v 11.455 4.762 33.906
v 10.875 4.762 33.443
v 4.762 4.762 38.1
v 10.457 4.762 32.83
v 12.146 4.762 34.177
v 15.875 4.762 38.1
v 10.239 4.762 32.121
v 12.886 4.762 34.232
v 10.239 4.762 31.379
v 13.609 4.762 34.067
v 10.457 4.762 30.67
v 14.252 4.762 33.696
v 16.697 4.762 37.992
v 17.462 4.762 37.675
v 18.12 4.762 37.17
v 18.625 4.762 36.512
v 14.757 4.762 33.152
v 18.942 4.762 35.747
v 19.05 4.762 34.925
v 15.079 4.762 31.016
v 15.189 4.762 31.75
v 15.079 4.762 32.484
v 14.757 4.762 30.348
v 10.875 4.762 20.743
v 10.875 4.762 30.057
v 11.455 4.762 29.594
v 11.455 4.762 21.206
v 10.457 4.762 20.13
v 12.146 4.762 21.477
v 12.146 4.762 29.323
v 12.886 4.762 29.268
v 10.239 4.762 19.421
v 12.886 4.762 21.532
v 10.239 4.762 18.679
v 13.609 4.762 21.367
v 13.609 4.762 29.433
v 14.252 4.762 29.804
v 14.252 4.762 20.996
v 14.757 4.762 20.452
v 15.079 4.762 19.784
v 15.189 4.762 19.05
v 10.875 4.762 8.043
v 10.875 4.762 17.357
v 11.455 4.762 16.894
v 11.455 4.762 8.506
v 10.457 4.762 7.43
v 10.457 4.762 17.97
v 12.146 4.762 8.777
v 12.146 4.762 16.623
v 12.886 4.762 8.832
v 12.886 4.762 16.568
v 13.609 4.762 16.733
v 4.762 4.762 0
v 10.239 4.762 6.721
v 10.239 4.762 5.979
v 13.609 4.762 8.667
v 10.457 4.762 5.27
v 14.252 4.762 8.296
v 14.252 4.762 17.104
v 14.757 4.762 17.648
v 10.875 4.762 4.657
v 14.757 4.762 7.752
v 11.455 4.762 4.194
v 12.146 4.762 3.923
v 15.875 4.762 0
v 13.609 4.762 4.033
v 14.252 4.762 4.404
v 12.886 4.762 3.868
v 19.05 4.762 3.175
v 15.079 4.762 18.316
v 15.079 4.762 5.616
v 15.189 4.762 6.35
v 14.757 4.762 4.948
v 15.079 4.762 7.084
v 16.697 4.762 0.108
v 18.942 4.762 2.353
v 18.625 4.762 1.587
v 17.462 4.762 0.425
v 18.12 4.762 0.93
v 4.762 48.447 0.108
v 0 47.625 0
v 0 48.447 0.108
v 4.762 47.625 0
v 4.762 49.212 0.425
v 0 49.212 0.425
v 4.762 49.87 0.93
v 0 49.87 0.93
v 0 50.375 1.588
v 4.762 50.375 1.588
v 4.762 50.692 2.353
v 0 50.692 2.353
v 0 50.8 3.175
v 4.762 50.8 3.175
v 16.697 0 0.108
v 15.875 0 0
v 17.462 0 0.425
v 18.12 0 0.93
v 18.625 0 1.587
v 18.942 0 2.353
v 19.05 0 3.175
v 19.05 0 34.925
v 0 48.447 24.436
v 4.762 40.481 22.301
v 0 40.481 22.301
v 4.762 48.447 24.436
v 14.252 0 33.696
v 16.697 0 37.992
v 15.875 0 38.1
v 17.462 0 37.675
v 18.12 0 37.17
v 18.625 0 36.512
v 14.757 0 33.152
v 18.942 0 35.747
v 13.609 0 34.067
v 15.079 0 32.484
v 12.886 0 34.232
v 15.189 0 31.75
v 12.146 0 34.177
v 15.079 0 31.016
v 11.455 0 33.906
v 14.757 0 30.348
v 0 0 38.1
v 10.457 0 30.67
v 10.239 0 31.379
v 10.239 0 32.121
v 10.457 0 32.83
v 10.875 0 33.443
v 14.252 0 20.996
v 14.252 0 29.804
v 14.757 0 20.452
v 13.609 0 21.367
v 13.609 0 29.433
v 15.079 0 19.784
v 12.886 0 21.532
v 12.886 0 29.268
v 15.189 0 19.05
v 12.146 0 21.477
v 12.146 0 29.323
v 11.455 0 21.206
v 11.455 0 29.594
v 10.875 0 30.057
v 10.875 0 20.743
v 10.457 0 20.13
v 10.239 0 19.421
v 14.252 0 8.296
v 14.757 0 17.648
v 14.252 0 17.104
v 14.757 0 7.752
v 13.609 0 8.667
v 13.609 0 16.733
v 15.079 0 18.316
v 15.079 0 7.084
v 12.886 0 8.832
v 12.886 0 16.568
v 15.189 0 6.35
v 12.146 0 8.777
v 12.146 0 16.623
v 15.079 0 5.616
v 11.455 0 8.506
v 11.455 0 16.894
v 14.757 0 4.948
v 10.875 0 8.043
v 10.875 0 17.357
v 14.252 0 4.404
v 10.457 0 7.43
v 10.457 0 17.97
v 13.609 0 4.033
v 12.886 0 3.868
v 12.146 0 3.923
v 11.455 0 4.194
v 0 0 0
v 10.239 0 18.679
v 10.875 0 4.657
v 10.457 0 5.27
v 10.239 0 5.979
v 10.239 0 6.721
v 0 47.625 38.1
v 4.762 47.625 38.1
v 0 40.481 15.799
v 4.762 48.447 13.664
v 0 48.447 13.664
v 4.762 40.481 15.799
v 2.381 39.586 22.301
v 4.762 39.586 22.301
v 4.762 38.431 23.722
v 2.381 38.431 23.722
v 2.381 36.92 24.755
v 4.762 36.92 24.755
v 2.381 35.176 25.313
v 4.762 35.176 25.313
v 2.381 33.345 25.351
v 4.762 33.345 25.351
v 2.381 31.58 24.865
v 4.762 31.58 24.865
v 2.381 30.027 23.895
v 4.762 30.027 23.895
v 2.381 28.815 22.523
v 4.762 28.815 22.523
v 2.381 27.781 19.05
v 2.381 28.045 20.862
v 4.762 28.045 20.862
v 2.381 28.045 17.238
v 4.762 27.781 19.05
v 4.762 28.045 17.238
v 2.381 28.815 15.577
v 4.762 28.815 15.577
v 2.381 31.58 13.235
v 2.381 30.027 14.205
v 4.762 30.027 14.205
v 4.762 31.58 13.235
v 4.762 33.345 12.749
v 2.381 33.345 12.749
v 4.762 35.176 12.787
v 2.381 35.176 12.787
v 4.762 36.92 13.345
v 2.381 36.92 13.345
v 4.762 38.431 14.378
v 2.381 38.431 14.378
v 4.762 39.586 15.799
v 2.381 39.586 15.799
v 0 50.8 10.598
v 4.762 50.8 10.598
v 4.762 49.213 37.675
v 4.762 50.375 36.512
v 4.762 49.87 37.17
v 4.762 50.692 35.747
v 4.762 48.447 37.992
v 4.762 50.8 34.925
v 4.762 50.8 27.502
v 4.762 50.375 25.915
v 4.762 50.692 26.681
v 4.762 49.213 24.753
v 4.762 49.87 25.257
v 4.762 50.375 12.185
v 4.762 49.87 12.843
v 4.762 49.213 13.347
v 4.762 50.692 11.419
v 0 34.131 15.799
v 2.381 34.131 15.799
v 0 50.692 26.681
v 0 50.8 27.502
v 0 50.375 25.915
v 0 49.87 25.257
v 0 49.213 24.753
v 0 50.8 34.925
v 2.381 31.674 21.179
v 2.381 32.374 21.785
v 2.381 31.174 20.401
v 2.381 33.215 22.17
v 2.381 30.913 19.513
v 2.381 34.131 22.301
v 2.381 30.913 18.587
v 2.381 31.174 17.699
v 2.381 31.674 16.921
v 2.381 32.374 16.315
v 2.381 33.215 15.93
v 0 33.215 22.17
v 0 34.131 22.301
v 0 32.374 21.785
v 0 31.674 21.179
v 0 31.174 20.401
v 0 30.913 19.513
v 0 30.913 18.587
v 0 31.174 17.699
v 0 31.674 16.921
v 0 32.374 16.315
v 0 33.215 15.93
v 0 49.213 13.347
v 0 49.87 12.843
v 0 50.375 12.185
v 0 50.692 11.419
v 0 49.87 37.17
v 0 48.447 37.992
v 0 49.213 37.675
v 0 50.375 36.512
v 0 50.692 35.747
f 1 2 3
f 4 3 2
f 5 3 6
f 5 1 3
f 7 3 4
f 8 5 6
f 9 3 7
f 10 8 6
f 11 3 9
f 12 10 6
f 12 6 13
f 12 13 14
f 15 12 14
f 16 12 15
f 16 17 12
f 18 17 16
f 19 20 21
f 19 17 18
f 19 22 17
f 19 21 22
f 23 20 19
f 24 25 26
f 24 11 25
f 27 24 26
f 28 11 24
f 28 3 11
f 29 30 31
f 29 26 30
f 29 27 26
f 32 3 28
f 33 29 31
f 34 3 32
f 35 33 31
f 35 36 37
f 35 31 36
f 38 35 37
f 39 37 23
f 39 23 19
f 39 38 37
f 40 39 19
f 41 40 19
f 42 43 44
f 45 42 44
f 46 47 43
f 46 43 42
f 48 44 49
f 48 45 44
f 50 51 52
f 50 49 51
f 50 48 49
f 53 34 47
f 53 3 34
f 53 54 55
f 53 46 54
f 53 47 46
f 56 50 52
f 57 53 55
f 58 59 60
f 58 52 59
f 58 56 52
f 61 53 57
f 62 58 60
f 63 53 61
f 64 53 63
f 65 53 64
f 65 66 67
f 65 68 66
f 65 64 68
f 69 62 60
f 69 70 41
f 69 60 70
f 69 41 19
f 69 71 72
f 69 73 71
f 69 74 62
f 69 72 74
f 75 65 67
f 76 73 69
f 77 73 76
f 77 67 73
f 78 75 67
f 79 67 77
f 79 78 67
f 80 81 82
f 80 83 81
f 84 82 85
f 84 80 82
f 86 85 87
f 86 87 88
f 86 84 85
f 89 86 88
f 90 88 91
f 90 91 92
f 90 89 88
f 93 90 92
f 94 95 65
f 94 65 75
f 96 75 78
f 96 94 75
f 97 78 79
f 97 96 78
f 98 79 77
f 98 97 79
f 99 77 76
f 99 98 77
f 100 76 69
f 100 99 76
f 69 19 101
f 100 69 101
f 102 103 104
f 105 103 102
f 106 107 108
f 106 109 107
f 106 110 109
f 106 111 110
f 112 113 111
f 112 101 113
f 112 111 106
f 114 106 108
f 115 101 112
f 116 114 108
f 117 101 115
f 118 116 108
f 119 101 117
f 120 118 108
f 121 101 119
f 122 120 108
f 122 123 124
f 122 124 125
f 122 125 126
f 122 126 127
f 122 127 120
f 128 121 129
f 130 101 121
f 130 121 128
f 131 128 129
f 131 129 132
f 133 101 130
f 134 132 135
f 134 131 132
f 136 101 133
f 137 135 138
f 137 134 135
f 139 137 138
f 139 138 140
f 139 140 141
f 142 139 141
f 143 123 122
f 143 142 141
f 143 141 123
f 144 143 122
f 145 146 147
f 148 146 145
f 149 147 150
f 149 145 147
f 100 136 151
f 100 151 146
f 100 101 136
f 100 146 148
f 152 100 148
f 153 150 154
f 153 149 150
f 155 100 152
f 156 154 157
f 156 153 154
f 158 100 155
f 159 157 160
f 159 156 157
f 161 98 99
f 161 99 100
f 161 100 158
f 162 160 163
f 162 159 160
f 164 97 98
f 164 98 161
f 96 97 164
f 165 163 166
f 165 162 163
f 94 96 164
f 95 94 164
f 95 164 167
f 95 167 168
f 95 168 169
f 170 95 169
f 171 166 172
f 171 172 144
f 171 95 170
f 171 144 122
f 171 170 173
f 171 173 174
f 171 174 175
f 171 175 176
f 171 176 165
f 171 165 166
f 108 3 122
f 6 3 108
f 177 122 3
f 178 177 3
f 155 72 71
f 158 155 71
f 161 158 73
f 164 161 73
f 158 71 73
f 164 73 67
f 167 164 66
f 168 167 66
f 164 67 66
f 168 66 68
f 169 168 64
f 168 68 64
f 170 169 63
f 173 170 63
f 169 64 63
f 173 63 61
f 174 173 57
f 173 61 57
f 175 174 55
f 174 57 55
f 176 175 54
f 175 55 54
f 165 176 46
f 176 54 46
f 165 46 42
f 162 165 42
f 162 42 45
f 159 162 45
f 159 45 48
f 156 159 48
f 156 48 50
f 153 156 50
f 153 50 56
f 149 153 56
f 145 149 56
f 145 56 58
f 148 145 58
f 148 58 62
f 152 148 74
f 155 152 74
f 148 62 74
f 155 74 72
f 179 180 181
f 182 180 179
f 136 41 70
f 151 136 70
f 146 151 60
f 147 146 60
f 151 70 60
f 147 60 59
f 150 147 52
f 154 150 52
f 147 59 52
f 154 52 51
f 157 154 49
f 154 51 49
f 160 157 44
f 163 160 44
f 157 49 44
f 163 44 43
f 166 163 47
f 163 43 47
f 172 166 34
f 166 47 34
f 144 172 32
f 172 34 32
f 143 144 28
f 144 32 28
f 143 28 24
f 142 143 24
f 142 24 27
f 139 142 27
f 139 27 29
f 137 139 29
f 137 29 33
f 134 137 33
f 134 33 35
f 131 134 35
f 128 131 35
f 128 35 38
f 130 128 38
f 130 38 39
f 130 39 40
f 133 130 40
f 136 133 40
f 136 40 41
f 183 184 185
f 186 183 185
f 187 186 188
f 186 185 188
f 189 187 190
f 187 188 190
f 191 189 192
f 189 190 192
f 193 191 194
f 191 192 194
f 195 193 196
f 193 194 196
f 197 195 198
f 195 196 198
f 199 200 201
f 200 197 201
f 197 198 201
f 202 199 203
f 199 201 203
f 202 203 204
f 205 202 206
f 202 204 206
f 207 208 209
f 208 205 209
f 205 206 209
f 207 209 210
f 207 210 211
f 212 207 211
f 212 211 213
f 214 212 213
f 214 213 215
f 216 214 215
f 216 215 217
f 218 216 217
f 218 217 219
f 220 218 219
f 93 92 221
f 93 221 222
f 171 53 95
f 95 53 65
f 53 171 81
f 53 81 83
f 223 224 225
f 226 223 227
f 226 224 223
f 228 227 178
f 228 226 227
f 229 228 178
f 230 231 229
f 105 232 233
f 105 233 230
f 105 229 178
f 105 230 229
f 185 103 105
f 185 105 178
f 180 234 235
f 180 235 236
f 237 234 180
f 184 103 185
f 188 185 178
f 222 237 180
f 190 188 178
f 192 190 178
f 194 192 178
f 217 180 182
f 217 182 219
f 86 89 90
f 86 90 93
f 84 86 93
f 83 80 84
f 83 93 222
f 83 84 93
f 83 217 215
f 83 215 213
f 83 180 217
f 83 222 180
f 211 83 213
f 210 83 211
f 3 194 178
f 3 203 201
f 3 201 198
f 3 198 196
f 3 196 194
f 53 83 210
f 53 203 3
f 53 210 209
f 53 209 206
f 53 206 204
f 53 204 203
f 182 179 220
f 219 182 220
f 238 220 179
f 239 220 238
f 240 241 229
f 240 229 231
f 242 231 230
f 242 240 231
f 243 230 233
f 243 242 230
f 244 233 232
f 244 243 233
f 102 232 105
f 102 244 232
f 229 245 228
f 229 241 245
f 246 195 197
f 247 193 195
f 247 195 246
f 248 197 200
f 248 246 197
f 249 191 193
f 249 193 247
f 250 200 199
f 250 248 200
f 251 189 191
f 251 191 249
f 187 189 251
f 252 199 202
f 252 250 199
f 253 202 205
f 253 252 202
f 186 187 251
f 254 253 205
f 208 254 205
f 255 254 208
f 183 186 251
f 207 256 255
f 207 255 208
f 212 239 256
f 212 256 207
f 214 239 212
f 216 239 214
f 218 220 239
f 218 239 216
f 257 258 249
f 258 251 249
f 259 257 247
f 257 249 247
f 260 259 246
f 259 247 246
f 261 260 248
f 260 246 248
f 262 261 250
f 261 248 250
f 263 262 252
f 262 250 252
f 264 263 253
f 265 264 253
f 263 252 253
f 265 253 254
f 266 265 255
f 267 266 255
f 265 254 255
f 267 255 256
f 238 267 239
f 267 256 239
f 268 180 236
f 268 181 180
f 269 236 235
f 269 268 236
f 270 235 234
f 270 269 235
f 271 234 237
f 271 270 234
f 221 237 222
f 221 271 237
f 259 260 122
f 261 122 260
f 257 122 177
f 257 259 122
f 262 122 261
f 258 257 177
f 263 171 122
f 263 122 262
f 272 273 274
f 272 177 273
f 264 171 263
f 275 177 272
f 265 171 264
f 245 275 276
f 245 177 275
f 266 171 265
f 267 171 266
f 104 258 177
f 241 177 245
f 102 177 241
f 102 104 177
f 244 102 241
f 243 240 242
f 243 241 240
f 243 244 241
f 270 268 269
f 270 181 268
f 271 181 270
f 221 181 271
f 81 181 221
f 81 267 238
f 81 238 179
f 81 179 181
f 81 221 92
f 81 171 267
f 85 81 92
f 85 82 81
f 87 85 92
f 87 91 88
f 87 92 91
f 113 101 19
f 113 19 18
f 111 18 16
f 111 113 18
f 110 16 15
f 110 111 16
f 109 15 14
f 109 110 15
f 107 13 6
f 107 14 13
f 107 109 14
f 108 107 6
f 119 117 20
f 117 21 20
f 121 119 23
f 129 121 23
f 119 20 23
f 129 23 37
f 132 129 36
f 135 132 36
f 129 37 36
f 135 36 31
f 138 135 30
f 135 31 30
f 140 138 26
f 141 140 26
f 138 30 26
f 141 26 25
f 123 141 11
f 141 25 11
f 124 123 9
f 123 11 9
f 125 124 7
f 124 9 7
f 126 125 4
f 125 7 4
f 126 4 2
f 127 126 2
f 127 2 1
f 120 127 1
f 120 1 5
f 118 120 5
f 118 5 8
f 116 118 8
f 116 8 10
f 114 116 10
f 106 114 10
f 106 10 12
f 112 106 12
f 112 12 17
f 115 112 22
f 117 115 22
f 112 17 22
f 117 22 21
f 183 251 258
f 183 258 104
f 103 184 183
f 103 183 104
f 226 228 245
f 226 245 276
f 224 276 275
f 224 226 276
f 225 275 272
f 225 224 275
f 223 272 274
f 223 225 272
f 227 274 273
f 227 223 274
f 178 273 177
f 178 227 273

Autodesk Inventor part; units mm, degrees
ref_plane "YZ Plane" through (0, 0, 0) normal (1, 0, 0) x (0, 1, 0)
ref_plane "XZ Plane" through (0, 0, 0) normal (0, 1, 0) x (-1, 0, 0)
ref_plane "XY Plane" through (0, 0, 0) normal (0, 0, 1) x (1, 0, 0)
sketch "Sketch2" plane through (0, 0, 0) normal (0, 0, 1) x (1, 0, 0)
  line L0 (0, 0) -> (0, 50.8)
  line L1 (0, 50.8) -> (4.7625, 50.8)
  line L2 (4.7625, 50.8) -> (4.7625, 4.7625)
  line L3 (4.7625, 4.7625) -> (19.05, 4.7625)
  line L4 (19.05, 4.7625) -> (19.05, 0)
  line L5 (19.05, 0) -> (0, 0)
  dimension "d0" = 4.7625
  dimension "d1" = 50.8
  dimension "d2" = 19.05
extrude "Extrusion1" add sketch "Sketch2" along normal blind 38.1
sketch "Sketch3" plane through (4.7625, 4.7625, 0) normal (1, 0, 0) x (0, 0, -1)
  circle A0 centre (-19.05, 29.3688) radius 3.2512
  line L0 (-22.3012, 29.3688) -> (-22.3012, 35.7188)
  line L1 (-22.3012, 35.7188) -> (-25.0661, 46.0375)
  line L2 (0, 46.0375) -> (-38.1, 46.0375) projected
  line L3 (-13.0339, 46.0375) -> (-15.7988, 35.7188)
  line L4 (-15.7988, 35.7188) -> (-15.7988, 29.3688)
  line L5 (-38.1, 0) -> (-38.1, 46.0375) projected
  point P0 (0, -4.7625)
  point P1 (-19.05, 46.0375)
  point P2 (-38.1, 23.0187)
  point P3 (-38.1, 23.0187)
  dimension "d5" = 6.5024
  dimension "d6" = 165
  dimension "d7" = 6.35
  dimension "d18" = 6.35
extrude "Extrusion2" cut sketch "Sketch3" against normal blind 38.1
sketch "Sketch4" plane through (4.7625, 4.7625, 0) normal (0, 1, 0) x (1, 0, 0)
  circle A0 centre (7.9375, -31.75) radius 2.4892
  circle A1 centre (7.9375, -6.35) radius 2.4892
  line L0 (14.2875, -38.1) -> (0, -38.1) projected
  line L1 (14.2875, 0) -> (0, 0) projected
  circle A2 centre (7.9375, -19.05) radius 2.4892
  line L2 (-4.7625, -25.0661) -> (-4.7625, -38.1) projected
  point P0 (-4.7625, 0)
  point P1 (7.1437, -38.1)
  dimension "d10" = 4.9784
  dimension "d11" = 4.9784
  dimension "d12" = 6.35
  dimension "d13" = 6.35
  dimension "d14" = 25.4
  dimension "d22" = 12.7
  dimension "d23" = 12.7
extrude "Extrusion3" cut sketch "Sketch4" against normal blind 38.1
fillet "Fillet1" radius 3.175 6 edges at (2.3813, 50.8, 38.1) (2.3813, 50.8, 25.0661) (2.3813, 50.8, 13.0339) (2.3813, 50.8, 0) (19.05, 2.3813, 38.1) (19.05, 2.3813, 0)
sketch "Sketch5" plane through (4.7625, 4.7625, 38.1) normal (1, 0, 0) x (0, 0, -1)
  arc A0 (15.7988, 29.3688) -> (22.3012, 29.3688) centre (19.05, 29.3688) ccw projected
  circle A1 centre (19.05, 29.3688) radius 6.35
  point P0 (38.1, -4.7625)
  dimension "d19" = 12.7
extrude "Extrusion4" cut sketch "Sketch5" against normal blind 2.3813
equation "\"d13\" = d12"
properties part number "BUMP_007_Smallbracket" material "Aluminum 6061"
